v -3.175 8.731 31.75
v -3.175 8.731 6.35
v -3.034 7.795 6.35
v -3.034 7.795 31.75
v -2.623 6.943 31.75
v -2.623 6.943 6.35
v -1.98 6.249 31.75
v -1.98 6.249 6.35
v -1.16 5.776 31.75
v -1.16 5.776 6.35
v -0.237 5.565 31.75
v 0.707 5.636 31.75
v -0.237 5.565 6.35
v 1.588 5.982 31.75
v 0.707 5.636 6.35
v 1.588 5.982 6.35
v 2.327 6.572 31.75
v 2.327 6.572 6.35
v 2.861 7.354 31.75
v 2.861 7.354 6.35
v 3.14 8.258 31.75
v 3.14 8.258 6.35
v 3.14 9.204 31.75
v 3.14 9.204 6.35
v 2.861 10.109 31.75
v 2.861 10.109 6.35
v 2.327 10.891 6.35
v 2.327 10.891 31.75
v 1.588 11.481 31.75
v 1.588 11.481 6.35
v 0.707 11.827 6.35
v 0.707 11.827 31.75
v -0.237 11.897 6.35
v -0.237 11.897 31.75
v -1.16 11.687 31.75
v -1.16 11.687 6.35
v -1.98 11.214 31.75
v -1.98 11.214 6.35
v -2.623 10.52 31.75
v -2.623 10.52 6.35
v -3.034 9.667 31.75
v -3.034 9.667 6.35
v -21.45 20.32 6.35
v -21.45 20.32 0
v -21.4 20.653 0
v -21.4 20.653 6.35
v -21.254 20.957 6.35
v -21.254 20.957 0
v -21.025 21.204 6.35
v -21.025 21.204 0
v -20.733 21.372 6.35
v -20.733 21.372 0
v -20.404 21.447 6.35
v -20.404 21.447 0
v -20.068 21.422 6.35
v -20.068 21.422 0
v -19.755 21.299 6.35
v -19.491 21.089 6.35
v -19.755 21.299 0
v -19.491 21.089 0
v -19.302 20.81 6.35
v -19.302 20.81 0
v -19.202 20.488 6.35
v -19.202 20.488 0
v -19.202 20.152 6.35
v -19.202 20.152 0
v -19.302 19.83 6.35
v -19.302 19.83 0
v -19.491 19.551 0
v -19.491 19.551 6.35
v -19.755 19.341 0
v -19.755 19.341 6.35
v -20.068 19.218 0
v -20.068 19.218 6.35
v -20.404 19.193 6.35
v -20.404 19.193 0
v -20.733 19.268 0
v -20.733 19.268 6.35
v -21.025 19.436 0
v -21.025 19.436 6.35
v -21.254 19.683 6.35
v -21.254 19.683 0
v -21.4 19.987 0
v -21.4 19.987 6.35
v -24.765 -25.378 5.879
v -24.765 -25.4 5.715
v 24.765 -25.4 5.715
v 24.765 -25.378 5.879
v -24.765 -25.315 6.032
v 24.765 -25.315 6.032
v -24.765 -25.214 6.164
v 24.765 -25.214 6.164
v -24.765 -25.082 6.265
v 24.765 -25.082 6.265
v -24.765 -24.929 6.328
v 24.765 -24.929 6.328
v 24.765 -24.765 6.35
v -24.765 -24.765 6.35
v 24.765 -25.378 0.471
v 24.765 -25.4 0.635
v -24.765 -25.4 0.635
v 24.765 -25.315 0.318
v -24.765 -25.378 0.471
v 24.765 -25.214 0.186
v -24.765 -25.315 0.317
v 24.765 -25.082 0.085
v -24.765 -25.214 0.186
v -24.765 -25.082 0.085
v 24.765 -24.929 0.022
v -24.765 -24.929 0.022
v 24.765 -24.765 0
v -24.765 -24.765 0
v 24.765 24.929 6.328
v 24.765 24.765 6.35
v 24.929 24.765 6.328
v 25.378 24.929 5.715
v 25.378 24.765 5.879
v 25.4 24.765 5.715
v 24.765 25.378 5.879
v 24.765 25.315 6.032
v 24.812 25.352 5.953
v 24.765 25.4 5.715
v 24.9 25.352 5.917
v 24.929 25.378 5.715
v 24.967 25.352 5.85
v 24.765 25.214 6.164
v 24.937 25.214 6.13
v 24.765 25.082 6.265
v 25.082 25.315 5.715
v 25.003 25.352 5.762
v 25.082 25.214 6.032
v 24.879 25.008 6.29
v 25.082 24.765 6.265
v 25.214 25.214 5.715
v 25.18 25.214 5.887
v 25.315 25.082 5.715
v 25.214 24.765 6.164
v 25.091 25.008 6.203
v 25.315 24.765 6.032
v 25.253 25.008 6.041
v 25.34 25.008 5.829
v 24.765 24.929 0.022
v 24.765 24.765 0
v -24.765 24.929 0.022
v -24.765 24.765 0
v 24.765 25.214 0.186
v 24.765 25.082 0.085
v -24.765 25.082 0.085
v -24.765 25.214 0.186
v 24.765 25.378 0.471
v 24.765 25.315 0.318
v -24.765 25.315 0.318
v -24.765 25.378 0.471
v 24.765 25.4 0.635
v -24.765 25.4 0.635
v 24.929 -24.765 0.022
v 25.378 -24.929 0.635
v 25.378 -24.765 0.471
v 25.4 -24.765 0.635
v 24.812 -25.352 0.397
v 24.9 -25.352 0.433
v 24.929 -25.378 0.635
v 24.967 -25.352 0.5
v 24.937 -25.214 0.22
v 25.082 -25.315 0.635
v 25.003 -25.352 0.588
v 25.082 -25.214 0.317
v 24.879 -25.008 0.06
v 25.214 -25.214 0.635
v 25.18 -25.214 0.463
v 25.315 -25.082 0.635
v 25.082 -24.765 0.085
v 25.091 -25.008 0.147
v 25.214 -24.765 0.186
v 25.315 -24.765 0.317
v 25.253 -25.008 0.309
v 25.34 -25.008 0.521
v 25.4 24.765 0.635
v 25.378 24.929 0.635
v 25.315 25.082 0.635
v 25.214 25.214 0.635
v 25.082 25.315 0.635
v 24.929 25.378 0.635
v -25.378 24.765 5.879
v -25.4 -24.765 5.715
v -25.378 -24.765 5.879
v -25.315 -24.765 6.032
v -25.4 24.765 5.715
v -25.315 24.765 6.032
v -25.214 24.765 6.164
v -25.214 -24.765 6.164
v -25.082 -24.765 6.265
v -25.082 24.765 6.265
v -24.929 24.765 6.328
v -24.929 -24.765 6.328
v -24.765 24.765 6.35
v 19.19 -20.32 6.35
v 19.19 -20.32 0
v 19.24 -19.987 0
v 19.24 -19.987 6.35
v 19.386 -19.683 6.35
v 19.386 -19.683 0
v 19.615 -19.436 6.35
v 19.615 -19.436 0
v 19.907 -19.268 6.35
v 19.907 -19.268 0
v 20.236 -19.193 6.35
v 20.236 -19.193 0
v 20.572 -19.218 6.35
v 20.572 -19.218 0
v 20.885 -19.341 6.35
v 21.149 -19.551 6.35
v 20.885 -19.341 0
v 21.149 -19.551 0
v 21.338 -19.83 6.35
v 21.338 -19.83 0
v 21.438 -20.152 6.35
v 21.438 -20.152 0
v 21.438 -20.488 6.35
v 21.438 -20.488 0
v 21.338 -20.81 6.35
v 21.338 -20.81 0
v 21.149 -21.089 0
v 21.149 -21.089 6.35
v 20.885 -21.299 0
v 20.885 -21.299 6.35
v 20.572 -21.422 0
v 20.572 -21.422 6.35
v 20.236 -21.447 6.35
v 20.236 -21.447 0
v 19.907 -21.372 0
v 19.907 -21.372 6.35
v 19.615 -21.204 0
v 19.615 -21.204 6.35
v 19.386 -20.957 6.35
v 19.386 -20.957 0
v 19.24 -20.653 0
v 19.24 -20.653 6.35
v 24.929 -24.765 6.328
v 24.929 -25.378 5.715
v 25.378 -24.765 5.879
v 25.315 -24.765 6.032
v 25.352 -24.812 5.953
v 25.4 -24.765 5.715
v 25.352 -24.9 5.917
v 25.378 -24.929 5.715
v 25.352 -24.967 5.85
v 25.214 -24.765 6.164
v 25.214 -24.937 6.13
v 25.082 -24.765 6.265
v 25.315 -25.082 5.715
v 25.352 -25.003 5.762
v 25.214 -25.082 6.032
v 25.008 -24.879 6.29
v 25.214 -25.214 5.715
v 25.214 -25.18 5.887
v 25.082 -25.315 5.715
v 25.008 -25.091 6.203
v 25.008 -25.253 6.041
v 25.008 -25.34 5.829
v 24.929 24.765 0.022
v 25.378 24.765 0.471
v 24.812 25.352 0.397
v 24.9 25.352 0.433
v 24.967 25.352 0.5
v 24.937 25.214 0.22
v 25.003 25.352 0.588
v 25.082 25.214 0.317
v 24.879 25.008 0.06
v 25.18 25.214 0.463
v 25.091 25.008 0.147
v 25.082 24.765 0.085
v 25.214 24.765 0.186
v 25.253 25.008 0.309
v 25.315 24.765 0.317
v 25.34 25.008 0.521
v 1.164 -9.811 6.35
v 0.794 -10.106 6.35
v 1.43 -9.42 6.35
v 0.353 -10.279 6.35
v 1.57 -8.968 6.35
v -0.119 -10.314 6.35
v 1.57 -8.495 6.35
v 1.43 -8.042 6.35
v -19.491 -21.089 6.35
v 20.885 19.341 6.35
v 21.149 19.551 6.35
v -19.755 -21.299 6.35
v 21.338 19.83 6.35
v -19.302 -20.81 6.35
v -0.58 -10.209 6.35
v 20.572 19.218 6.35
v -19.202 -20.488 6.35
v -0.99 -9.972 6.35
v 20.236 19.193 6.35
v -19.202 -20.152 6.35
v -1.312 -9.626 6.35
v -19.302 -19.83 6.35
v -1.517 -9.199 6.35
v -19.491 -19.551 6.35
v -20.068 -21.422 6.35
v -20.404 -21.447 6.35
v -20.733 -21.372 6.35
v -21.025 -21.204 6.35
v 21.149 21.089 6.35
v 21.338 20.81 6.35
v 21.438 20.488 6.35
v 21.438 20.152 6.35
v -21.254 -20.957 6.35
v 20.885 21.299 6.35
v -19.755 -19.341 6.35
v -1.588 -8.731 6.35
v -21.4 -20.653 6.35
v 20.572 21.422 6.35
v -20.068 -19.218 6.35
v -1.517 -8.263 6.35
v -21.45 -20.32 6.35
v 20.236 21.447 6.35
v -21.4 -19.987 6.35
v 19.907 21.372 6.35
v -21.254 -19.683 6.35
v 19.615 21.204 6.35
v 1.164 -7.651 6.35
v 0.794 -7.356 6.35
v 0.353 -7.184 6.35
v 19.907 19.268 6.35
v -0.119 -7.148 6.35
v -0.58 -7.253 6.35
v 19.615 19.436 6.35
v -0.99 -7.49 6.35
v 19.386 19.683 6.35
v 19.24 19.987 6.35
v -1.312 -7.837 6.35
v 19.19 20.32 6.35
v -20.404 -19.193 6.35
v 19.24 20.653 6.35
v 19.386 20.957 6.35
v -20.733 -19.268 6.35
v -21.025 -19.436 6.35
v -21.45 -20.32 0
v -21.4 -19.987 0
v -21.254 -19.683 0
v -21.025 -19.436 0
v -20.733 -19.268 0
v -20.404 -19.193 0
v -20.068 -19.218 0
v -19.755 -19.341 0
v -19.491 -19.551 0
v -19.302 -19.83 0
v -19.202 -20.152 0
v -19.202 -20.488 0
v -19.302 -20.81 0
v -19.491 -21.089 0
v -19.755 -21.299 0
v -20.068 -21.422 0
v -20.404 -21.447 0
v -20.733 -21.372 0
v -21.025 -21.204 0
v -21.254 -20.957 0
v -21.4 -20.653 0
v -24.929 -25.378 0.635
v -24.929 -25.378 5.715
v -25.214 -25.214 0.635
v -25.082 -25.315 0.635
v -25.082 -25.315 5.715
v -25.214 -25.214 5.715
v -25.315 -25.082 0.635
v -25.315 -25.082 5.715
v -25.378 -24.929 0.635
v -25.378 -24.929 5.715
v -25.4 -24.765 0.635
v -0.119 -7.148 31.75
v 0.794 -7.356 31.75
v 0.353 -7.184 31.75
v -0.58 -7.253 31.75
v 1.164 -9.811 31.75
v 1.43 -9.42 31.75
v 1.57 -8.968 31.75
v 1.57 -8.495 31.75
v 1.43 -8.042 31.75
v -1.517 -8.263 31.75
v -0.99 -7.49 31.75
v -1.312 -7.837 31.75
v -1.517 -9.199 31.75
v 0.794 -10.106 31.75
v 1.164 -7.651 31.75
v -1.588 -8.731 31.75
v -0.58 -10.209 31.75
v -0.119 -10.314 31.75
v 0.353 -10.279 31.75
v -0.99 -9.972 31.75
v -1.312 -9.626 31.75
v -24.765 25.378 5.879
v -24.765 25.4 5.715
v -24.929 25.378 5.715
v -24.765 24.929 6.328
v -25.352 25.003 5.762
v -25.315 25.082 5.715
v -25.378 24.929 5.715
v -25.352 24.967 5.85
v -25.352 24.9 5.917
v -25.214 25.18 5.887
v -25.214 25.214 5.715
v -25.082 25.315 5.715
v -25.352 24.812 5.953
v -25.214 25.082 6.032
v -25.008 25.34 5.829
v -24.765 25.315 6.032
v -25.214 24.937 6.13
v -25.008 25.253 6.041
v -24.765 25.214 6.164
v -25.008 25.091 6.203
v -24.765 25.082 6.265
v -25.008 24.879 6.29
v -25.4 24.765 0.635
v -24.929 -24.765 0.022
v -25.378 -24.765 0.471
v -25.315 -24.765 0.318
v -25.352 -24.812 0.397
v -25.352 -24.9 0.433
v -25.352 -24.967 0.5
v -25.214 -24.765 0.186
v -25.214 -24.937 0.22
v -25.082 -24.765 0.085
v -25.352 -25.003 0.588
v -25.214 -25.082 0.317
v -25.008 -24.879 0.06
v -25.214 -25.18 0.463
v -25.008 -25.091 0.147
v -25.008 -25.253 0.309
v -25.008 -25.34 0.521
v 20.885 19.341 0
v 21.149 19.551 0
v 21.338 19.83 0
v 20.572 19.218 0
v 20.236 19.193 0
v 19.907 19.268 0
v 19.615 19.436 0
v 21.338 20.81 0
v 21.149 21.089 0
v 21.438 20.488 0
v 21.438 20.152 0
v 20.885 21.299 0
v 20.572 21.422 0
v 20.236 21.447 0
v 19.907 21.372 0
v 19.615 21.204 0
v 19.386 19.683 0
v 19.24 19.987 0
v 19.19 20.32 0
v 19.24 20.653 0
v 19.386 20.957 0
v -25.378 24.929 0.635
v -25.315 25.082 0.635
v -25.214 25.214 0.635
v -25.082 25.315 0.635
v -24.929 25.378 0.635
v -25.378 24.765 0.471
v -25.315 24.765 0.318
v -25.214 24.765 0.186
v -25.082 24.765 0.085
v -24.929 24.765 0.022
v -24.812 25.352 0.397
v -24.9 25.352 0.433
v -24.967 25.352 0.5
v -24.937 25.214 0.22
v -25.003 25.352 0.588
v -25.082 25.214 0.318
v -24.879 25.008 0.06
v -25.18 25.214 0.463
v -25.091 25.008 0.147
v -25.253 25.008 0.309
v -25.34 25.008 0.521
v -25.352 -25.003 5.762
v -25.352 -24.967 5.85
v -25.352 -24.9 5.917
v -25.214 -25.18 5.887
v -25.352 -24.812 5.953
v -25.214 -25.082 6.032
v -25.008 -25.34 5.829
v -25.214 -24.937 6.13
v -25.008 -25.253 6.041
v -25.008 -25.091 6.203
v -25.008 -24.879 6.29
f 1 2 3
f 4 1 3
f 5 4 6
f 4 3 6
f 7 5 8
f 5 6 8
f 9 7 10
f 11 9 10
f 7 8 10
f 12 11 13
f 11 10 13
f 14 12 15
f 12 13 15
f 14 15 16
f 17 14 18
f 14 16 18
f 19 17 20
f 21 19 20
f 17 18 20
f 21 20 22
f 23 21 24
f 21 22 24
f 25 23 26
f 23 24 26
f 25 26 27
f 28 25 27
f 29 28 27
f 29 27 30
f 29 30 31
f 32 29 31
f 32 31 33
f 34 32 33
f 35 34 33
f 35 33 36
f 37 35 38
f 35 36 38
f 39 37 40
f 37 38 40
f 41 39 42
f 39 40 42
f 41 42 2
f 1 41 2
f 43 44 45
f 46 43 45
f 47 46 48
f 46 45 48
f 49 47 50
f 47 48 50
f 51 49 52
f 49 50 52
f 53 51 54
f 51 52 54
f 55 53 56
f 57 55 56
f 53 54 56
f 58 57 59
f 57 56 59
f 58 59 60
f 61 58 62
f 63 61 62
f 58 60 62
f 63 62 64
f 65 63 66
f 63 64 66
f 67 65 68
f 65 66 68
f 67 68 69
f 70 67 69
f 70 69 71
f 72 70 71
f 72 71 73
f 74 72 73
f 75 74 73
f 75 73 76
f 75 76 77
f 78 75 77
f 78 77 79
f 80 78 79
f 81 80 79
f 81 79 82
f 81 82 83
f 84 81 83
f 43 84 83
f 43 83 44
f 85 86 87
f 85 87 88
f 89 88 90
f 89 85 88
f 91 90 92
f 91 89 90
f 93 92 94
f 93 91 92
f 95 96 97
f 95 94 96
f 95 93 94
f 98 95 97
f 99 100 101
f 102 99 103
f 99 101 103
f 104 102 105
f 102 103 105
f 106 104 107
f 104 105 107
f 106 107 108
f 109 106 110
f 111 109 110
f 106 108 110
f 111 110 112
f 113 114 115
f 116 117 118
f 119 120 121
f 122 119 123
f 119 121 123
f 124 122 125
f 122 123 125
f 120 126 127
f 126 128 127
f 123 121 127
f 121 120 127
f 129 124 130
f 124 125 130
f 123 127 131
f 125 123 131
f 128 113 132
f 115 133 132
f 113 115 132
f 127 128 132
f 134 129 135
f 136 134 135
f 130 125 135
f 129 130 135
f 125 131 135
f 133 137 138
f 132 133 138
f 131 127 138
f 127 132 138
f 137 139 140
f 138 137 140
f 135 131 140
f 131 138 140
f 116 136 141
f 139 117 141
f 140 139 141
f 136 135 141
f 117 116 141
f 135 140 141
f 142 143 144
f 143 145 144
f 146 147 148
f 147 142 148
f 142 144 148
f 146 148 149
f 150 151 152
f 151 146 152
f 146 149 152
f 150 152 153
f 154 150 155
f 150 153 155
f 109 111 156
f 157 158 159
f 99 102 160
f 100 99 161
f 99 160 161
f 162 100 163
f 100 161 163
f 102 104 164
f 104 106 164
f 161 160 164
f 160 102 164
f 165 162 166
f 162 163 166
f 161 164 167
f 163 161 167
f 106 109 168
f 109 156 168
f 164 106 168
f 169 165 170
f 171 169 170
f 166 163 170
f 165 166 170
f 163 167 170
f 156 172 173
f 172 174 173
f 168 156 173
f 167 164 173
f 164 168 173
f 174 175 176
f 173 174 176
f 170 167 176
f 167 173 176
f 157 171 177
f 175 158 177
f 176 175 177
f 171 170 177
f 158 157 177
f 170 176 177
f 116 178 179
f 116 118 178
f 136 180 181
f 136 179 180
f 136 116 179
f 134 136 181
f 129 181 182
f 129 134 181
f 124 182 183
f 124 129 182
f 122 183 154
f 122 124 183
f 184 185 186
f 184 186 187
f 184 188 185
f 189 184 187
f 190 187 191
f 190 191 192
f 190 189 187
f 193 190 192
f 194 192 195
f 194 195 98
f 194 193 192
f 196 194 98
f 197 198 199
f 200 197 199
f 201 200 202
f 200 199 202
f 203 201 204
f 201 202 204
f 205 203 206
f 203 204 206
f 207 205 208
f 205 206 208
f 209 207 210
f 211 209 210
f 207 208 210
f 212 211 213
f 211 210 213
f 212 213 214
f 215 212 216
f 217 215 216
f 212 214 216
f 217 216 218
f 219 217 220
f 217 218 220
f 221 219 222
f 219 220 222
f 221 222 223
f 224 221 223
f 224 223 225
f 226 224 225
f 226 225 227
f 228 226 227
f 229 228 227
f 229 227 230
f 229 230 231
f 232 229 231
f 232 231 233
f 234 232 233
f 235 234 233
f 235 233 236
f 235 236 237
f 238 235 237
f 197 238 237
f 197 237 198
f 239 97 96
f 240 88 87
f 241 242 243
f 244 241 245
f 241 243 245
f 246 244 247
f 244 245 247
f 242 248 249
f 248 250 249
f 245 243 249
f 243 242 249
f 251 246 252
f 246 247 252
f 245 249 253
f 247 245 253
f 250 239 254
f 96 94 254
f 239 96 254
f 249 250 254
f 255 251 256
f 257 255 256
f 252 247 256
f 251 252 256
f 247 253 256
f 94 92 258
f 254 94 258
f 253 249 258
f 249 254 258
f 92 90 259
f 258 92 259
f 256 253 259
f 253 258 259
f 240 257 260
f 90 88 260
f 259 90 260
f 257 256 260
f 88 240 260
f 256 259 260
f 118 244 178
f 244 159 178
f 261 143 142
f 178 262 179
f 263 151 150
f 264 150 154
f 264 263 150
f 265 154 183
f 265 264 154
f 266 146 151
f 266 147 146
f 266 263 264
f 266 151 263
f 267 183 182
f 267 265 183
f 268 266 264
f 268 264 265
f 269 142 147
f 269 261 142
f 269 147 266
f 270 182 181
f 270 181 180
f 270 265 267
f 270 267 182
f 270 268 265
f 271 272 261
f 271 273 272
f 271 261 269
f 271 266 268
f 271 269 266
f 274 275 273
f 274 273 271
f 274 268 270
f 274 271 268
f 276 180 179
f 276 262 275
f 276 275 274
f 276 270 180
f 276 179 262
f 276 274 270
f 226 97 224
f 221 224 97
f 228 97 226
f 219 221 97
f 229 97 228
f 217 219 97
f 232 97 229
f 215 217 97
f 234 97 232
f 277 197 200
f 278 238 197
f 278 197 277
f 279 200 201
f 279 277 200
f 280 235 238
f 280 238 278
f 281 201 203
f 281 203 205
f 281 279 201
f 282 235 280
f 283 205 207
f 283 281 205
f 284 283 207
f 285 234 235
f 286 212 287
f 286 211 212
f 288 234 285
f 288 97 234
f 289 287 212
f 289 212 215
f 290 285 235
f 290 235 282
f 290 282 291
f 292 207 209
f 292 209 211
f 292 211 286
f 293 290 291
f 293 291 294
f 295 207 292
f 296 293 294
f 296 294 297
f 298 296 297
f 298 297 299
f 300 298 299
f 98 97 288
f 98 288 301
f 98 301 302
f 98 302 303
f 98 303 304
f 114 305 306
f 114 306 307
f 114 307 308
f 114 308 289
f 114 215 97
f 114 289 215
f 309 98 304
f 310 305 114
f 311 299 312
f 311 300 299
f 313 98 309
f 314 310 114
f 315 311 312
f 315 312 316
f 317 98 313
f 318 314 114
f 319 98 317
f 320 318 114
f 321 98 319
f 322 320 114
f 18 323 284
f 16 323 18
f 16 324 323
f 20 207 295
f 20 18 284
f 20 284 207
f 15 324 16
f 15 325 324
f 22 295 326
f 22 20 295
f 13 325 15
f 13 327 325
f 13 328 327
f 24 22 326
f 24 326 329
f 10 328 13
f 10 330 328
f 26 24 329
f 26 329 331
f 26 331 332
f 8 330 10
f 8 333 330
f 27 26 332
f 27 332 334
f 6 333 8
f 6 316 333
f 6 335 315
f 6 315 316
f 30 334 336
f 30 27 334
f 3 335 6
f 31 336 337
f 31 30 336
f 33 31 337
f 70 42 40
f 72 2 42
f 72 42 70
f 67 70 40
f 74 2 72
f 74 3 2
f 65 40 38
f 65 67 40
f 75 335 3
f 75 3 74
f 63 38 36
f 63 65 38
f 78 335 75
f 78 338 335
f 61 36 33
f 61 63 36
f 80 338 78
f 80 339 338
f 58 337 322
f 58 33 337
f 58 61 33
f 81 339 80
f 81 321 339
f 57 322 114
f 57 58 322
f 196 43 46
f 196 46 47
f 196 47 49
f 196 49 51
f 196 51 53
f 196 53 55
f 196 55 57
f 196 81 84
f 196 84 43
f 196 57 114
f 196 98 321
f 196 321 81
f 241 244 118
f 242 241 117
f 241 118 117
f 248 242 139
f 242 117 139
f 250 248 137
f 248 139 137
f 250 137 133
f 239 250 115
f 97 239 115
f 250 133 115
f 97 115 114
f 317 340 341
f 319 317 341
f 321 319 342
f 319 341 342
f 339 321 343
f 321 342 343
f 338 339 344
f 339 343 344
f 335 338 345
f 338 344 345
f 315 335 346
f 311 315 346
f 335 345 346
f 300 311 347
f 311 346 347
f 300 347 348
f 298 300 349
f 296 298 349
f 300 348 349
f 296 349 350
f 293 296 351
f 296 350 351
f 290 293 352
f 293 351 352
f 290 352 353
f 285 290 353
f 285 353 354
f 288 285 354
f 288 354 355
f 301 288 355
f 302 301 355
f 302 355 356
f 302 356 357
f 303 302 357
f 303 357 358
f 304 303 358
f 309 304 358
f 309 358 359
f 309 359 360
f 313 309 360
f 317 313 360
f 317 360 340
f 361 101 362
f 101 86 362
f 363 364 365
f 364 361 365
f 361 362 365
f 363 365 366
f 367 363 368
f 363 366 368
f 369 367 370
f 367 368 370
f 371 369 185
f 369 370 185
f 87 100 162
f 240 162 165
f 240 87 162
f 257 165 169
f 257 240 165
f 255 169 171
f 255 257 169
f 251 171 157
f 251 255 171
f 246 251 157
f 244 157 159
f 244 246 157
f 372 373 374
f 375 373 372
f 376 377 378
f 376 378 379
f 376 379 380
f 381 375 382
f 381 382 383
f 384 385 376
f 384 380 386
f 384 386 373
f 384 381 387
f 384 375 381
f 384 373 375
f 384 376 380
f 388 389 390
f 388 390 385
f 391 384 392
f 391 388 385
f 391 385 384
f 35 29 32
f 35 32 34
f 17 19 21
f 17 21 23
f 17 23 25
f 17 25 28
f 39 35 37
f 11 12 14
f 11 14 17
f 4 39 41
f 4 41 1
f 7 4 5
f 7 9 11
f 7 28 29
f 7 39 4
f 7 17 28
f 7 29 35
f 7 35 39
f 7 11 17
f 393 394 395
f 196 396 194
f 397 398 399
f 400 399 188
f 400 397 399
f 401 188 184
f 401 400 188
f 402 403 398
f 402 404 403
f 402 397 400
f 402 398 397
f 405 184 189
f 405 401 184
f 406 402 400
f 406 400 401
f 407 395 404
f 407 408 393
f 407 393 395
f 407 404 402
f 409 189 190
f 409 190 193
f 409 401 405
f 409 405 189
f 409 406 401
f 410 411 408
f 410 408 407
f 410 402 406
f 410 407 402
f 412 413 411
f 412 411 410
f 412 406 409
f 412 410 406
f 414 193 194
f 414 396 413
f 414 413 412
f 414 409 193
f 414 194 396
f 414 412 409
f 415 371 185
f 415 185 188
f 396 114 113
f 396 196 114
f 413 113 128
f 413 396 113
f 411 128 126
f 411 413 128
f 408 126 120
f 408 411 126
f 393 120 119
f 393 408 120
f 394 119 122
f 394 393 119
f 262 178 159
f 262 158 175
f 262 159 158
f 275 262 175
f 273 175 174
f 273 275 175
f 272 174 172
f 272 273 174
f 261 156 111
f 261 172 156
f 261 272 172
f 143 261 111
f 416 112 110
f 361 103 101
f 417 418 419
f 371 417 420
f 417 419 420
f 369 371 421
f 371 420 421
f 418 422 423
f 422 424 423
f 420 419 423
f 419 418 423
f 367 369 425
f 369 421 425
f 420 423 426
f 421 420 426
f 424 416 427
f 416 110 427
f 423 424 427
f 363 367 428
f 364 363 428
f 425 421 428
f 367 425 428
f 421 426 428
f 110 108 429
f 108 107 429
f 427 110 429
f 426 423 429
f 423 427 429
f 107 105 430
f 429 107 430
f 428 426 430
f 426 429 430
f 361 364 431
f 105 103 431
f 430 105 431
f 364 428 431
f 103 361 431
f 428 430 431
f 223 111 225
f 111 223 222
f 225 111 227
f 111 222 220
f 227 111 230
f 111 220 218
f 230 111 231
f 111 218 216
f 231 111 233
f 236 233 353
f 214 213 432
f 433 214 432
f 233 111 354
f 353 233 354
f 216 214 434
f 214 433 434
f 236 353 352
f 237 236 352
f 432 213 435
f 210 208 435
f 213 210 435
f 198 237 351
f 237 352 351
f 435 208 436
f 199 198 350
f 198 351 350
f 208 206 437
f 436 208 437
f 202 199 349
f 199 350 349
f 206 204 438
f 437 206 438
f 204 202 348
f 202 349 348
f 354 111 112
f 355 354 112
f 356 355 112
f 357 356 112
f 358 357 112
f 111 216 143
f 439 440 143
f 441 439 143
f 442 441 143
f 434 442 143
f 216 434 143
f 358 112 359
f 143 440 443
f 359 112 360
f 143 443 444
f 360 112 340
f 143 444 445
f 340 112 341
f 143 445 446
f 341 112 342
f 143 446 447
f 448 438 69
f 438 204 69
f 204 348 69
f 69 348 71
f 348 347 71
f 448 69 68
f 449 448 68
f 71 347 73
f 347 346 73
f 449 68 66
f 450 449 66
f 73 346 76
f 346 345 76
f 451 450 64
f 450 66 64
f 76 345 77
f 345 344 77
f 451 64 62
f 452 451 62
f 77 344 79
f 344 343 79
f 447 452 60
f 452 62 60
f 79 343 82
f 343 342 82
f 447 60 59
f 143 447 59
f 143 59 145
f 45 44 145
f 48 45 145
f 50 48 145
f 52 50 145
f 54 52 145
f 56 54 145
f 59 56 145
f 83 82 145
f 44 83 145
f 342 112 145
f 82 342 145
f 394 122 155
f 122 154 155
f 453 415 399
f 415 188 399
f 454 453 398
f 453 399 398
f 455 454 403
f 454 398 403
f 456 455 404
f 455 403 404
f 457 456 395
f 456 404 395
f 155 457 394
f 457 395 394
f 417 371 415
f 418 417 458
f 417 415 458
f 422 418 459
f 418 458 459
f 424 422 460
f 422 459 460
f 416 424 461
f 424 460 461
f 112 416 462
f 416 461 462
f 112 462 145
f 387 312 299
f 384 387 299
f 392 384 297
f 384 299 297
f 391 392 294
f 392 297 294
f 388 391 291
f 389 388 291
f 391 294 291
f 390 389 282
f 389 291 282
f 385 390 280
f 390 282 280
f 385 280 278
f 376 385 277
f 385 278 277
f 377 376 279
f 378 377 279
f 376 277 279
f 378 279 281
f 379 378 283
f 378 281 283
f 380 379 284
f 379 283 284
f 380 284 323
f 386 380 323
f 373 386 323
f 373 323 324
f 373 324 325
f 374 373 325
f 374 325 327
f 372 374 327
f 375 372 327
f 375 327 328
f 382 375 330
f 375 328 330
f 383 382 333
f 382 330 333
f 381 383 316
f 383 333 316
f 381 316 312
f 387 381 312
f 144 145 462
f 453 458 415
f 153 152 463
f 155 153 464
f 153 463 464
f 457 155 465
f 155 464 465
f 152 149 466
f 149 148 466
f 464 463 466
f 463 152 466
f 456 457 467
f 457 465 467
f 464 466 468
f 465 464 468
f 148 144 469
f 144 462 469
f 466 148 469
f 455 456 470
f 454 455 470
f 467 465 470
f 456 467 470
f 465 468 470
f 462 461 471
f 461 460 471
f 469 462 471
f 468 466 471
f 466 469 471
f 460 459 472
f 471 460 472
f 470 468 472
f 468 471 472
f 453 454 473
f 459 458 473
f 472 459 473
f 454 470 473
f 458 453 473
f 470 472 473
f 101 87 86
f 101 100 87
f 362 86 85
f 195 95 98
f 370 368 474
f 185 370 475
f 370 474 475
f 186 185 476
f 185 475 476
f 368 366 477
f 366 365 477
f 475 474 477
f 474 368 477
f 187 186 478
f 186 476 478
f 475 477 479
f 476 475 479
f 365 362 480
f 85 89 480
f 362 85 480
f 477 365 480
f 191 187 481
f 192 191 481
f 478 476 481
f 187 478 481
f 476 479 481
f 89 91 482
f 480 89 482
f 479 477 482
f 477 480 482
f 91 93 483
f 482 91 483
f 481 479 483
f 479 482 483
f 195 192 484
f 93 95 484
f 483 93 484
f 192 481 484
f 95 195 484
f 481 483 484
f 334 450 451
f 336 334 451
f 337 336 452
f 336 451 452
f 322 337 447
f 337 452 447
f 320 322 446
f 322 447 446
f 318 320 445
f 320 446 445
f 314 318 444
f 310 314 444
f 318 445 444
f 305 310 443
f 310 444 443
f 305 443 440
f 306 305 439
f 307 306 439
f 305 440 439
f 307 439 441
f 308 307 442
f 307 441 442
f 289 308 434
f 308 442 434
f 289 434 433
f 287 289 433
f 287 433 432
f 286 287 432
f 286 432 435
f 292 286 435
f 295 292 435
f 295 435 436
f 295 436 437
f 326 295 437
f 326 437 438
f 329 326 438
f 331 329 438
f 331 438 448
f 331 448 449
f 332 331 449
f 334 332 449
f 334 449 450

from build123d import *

# Parameters (mm, degrees)
SKETCH1_W             = 50.8
SKETCH1_H             = 50.8
BOSS_EXTRUDE1_DEPTH   = 6.35
SKETCH2_R             = 1.5875
SKETCH2_R_2           = 3.175
BOSS_EXTRUDE2_DEPTH   = 25.4
F_4_40_TAPPED_HOLE1_D = 2.2606
FILLET1_R             = 0.635


with BuildPart() as part:
    # Sketch1 → Boss-Extrude1 (new body)
    with BuildSketch(Plane(origin=(0, 0, 0), x_dir=(0, 1, 0), z_dir=(0, 0, 1))):
        Rectangle(SKETCH1_W, SKETCH1_H)
    extrude(amount=BOSS_EXTRUDE1_DEPTH)

    # Sketch2 → Boss-Extrude2 (add)
    with BuildSketch(Plane.XY.offset(6.35)):
        with Locations(Location((0, -8.73125, 0), (0, 0, 180))):
            Circle(SKETCH2_R)
        with Locations(Location((0, 8.73125, 0), (0, 0, 180))):
            Circle(SKETCH2_R_2)
    extrude(amount=BOSS_EXTRUDE2_DEPTH)

    # #4-40 Tapped Hole1 (through all)
    with Locations(Plane.XY.offset(6.35)):
        with Locations((-20.32, -20.32), (-20.32, 20.32), (20.32, 20.32), (20.32, -20.32)):
            Hole(F_4_40_TAPPED_HOLE1_D / 2)

    # Fillet1
    fillet1_edges = [part.edges().sort_by_distance(p)[0] for p in [
        (0, -25.4, 6.35),
        (25.4, 0, 6.35),
        (0, 25.4, 6.35),
        (25.4, 0, 0),
        (0, -25.4, 0),
        (-25.4, 0, 0),
        (0, 25.4, 0),
        (25.4, 25.4, 3.175),
        (25.4, -25.4, 3.175),
        (-25.4, -25.4, 3.175),
        (-25.4, 25.4, 3.175),
        (-25.4, 0, 6.35),
    ]]
    fillet(fillet1_edges, radius=FILLET1_R)


solid = part.part
